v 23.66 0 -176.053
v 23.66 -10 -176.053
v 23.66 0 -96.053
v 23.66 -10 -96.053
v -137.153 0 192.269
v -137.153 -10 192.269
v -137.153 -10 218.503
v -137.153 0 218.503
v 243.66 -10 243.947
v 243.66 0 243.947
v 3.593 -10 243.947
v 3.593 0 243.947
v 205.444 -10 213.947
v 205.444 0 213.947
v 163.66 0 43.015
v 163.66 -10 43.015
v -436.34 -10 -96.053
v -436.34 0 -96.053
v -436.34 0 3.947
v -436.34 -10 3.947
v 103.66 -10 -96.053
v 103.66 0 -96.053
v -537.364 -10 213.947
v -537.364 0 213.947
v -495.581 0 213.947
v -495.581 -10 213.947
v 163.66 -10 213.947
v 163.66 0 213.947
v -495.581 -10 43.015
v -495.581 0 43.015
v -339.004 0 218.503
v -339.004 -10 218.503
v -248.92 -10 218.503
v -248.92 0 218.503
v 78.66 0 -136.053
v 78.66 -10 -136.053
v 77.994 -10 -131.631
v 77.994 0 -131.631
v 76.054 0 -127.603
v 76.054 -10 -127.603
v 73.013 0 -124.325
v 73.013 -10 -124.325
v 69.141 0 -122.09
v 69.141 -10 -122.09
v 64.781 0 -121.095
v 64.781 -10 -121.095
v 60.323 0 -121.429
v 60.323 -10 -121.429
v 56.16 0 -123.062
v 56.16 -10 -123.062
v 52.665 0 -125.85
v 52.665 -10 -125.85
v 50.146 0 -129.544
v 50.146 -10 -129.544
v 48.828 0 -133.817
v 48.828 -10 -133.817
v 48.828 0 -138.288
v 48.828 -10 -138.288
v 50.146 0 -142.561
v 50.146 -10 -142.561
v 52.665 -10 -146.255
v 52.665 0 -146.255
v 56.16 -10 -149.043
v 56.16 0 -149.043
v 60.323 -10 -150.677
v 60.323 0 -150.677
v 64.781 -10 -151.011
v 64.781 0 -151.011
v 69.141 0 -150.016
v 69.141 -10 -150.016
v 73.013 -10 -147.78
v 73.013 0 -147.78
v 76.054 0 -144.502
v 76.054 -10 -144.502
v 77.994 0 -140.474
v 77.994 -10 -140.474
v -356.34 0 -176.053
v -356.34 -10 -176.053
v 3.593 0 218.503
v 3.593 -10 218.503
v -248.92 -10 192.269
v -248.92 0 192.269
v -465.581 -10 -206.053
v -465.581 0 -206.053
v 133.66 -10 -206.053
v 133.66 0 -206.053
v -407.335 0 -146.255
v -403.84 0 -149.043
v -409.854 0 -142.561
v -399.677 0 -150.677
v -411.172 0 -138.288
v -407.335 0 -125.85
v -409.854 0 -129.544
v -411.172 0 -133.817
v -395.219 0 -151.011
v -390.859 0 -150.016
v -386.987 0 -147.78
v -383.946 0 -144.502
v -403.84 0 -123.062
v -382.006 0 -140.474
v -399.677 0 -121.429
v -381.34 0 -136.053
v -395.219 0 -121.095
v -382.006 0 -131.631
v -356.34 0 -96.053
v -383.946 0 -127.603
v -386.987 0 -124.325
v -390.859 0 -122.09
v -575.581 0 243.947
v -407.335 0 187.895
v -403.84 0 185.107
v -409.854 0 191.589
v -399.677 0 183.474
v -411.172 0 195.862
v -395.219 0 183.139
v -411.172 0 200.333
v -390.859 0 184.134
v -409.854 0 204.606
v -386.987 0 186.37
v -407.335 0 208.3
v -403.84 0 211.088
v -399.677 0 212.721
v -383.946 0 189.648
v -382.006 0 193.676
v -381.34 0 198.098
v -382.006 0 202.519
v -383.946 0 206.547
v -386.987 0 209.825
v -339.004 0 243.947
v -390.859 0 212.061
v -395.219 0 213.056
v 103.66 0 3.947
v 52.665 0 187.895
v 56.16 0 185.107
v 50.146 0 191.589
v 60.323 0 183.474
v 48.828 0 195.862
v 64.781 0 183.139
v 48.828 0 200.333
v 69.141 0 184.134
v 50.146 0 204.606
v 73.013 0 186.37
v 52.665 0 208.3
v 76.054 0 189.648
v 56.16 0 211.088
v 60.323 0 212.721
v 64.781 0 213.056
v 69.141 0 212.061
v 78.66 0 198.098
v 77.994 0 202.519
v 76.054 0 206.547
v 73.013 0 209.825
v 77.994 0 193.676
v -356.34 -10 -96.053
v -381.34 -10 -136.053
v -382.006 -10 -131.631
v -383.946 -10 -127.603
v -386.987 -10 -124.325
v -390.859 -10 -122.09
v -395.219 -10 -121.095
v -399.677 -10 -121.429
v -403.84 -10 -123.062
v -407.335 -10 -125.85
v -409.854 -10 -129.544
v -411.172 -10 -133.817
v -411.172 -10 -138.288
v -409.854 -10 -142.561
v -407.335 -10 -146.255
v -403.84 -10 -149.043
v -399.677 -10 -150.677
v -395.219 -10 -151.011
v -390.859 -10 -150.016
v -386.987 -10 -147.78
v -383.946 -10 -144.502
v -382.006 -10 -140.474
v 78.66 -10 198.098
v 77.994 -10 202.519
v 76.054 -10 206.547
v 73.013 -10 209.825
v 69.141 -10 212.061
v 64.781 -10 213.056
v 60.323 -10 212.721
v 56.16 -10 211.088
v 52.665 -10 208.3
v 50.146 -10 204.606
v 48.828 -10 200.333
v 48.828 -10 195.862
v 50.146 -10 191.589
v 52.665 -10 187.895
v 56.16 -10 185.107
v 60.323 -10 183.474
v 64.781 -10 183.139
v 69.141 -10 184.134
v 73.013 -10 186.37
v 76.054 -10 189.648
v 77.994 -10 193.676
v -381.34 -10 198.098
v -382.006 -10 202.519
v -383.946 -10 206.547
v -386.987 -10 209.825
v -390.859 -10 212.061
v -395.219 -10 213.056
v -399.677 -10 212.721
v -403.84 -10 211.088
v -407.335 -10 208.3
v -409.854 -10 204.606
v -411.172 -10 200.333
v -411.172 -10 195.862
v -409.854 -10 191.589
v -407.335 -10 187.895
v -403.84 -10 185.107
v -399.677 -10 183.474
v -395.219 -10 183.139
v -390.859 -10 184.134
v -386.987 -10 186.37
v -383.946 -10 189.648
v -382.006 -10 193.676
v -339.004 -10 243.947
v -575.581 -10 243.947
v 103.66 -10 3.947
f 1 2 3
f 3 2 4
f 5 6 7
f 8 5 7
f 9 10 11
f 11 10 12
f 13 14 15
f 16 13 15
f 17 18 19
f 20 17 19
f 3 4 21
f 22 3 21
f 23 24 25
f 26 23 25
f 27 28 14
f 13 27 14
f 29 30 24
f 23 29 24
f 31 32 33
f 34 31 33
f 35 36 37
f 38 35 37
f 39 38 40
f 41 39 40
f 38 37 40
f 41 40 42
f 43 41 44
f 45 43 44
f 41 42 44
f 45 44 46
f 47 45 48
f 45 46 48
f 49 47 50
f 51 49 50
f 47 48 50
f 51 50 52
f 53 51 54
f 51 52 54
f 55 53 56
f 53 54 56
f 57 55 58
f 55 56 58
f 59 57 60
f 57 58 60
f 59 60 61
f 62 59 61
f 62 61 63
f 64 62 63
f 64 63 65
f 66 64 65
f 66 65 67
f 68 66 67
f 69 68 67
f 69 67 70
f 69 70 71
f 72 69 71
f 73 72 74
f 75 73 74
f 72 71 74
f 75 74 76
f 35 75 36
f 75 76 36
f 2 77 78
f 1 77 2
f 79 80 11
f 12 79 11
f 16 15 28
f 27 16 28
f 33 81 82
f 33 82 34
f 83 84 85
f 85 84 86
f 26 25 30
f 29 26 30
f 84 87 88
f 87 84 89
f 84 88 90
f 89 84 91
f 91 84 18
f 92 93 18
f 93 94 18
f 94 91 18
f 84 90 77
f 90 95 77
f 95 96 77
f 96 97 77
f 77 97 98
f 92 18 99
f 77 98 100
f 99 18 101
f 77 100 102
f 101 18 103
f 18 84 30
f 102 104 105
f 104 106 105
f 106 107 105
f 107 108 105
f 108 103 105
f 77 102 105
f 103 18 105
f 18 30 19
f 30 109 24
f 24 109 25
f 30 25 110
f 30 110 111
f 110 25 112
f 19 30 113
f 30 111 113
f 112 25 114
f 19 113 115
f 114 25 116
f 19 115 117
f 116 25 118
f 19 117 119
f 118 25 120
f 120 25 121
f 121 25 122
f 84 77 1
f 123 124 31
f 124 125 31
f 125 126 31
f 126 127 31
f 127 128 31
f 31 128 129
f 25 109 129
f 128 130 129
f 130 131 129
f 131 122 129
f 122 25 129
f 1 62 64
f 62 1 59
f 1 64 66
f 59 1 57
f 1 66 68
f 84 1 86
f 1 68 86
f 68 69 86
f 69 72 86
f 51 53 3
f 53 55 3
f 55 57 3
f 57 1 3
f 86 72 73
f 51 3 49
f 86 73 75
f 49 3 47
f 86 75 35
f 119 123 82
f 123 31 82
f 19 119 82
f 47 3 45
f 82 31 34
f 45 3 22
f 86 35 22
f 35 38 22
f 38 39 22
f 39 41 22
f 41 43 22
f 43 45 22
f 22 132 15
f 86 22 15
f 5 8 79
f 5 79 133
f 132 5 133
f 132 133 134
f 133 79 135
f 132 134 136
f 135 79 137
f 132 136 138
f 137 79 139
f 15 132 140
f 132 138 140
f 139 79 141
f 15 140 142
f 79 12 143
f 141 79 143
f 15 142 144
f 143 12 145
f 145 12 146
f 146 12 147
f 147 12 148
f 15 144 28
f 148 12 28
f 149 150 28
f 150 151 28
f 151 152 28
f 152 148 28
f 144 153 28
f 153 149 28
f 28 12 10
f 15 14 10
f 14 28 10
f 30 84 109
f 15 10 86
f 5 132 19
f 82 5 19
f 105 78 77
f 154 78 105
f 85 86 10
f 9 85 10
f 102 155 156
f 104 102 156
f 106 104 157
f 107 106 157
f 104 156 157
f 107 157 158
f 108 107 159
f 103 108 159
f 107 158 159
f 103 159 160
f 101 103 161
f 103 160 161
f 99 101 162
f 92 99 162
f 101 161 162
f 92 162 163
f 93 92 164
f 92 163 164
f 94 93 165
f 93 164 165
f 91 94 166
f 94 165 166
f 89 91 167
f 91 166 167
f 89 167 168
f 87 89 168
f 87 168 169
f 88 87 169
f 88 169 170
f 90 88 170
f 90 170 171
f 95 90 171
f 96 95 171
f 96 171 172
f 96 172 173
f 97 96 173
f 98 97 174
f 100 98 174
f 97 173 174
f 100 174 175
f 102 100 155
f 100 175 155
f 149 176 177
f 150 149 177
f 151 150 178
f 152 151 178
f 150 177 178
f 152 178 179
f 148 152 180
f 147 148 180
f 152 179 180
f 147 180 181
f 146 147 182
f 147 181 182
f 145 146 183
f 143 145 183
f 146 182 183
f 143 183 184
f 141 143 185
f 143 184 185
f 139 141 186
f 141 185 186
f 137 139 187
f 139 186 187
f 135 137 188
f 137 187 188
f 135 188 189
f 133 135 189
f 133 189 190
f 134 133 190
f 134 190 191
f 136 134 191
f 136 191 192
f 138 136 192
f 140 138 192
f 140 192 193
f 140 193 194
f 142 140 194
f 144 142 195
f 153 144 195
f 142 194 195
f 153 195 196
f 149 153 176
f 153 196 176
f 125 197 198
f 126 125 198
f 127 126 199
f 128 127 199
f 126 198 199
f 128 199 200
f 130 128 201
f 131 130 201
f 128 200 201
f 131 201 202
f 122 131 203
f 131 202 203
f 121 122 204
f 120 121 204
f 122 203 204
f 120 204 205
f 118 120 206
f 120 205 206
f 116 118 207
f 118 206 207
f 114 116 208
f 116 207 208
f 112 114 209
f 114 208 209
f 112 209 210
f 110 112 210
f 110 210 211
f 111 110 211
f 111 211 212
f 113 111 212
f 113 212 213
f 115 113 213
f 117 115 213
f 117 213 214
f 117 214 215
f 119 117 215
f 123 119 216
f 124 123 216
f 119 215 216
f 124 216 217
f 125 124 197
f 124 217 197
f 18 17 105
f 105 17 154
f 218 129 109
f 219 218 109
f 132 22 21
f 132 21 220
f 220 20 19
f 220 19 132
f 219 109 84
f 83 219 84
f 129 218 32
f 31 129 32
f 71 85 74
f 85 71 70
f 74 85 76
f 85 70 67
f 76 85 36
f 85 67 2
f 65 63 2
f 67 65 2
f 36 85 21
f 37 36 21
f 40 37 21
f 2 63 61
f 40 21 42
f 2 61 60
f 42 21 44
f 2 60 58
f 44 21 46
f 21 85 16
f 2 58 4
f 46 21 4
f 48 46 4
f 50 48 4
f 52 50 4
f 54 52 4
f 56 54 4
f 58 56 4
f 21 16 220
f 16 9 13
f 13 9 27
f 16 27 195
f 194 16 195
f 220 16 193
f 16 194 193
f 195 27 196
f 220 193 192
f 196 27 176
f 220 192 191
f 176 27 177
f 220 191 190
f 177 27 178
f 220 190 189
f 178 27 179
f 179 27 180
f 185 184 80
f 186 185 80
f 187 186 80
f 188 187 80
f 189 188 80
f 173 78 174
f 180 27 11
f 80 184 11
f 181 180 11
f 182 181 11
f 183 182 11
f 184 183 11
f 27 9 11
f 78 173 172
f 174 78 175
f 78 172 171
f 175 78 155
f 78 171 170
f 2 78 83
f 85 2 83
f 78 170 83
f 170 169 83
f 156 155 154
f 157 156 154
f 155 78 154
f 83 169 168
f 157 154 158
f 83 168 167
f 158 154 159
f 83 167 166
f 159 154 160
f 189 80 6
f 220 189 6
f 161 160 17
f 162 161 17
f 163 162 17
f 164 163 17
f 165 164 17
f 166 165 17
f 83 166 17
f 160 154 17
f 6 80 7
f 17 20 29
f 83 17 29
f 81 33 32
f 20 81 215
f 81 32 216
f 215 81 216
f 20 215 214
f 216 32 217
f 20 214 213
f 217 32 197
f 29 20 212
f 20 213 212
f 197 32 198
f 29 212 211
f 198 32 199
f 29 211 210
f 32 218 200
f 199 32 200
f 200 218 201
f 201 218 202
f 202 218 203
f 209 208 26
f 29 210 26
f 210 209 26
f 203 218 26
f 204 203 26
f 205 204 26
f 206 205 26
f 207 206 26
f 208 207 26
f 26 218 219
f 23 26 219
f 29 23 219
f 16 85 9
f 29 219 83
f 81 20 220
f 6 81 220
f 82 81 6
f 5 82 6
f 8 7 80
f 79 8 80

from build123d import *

# Parameters (mm, degrees)
F0_W      = 540
F0_H      = 390
F1_DEPTH  = 10
F2_W      = 80
F2_H      = 80
F2_R      = 15
F3_DEPTH  = 10
F5_W      = 380
F5_H      = 80
F6_DEPTH  = 10
F7_DEPTH  = 25
F8_W      = 111.767
F8_H      = 26.2346411405
F9_DEPTH  = 25
F10_DEPTH = 130


with BuildPart() as f1:
    # F0 (on Front) → F1 (new body)
    with BuildSketch(Plane.XZ):
        Polygon((-575.5810141563, 243.9473703504), (-465.5810141563, -206.0526296496), (133.660423523, -206.0526296496), (243.660423523, 243.9473703504), (133.660423523, 243.9473703504), (-465.5810141563, 243.9473703504), align=None)
        with Locations((-166.339576477, 18.9473703504)):
            Rectangle(F0_W, F0_H, mode=Mode.SUBTRACT)
        Polygon((-495.5810141563, 43.0153865893), (-537.3643879646, 213.9473703504), (-495.5810141563, 213.9473703504), align=None, mode=Mode.SUBTRACT)
        Polygon((163.660423523, 213.9473703504), (205.4437973313, 213.9473703504), (163.660423523, 43.0153865893), align=None, mode=Mode.SUBTRACT)
    extrude(amount=F1_DEPTH)

    # F2 (on face) → F3 (join)
    with BuildSketch(Plane.XZ.offset(10)):
        with Locations((-396.339576477, 173.9473703504)):
            Rectangle(F2_W, F2_H)
        with Locations((-396.339576477, 198.0975481868)):
            Circle(F2_R, mode=Mode.SUBTRACT)
        with Locations((63.660423523, 173.9473703504)):
            Rectangle(F2_W, F2_H)
        with Locations((63.660423523, 198.0975481868)):
            Circle(F2_R, mode=Mode.SUBTRACT)
        with Locations((63.660423523, -136.0526296496)):
            Rectangle(F2_W, F2_H)
        with Locations((63.660423523, -136.0526296496)):
            Circle(F2_R, mode=Mode.SUBTRACT)
        with Locations((-396.339576477, -136.0526296496)):
            Rectangle(F2_W, F2_H)
        with Locations((-396.339576477, -136.0526296496)):
            Circle(F2_R, mode=Mode.SUBTRACT)
    extrude(amount=-F3_DEPTH)

    # F5 (on face) → F6 (join)
    with BuildSketch(Plane.XZ.offset(10)):
        with Locations((-166.339576477, 173.9473703504)):
            Rectangle(F5_W, F5_H)
    extrude(amount=-F6_DEPTH)

    # F4 (on face) → F7 (cut)
    with BuildSketch(Plane.XZ.offset(10)):
        Polygon((3.5932296524, 243.9473703504), (-339.0040903476, 243.9473703504), (-339.0040903476, 218.5033703504), (-286.9719266891, 218.5033703504), (3.5932296524, 218.5033703504), align=None)
    extrude(amount=-F7_DEPTH, mode=Mode.SUBTRACT)

    # F8 (on face) → F9 (cut)
    with BuildSketch(Plane.XZ.offset(10)):
        with Locations((-193.0365383425, 205.3860497801)):
            Rectangle(F8_W, F8_H)
    extrude(amount=-F9_DEPTH, mode=Mode.SUBTRACT)

    # F10 (add): a face of the model
    f10_faces = [f1.faces().sort_by_distance(p)[0] for p in [
        (-166.339576477, -5, 133.9473703504),
    ]]
    extrude(f10_faces, amount=F10_DEPTH)


solid = f1.part
